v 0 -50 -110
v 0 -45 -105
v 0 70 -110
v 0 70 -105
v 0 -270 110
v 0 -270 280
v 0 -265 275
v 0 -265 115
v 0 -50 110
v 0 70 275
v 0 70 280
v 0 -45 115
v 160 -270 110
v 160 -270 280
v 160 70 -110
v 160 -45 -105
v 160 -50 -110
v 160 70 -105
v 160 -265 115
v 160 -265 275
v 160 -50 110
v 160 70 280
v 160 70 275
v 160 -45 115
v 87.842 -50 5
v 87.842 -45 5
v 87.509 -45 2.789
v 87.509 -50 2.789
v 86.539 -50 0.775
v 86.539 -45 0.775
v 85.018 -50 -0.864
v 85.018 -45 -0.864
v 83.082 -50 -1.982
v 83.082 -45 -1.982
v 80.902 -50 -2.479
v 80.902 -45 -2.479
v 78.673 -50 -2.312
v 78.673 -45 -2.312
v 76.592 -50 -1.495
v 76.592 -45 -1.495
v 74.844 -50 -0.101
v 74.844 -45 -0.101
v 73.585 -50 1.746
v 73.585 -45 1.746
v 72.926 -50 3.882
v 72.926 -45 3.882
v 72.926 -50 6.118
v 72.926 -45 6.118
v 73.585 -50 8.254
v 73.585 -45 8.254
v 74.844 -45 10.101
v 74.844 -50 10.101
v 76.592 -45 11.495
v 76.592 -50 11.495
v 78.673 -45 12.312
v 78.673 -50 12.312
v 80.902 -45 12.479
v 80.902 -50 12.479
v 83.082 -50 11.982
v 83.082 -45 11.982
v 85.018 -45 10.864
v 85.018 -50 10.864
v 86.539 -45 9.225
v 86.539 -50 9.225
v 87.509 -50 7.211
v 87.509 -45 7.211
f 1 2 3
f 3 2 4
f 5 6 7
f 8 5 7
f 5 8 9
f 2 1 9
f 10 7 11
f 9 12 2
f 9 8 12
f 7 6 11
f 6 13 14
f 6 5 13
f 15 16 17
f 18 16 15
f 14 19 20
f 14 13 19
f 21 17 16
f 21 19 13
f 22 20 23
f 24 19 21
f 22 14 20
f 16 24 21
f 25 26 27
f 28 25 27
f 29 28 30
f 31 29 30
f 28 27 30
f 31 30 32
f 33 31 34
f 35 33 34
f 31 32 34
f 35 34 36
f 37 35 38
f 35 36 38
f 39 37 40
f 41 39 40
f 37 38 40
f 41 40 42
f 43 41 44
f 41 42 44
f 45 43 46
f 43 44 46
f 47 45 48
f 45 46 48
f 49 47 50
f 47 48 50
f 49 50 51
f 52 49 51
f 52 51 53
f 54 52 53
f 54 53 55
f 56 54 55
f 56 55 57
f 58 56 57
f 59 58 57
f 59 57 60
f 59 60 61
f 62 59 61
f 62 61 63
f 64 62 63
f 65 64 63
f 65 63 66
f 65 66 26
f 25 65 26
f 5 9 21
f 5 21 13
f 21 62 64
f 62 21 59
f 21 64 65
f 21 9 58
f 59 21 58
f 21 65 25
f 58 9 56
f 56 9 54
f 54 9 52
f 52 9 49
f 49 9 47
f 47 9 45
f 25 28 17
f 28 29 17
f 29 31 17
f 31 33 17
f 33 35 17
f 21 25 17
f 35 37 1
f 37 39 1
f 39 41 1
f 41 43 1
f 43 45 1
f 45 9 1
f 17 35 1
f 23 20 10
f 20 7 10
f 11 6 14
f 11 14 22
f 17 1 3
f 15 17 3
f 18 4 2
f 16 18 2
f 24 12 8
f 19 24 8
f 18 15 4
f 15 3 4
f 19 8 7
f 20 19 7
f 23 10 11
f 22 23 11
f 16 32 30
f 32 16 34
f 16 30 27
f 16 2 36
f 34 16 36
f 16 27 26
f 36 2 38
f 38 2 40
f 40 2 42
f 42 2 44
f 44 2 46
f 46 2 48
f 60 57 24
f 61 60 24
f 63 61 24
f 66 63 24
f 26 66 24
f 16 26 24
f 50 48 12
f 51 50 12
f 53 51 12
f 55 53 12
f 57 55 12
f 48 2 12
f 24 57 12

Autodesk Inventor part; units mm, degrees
ref_plane "YZ Plane" through (0, 0, 0) normal (1, 0, 0) x (0, 1, 0)
ref_plane "XZ Plane" through (0, 0, 0) normal (0, 1, 0) x (-1, 0, 0)
ref_plane "XY Plane" through (0, 0, 0) normal (0, 0, 1) x (1, 0, 0)
sketch "Sketch1" plane through (0, 0, 0) normal (1, 0, 0) x (0, 1, 0)
  line L0 (-50, 110) -> (-50, -110)
  line L1 (-50, -110) -> (45, -110)
  line L2 (-50, 110) -> (-270, 110)
  line L3 (-270, 110) -> (-270, 280)
  line L4 (-270, 280) -> (70, 280)
  line L5 (70, -105) -> (-45, -105)
  line L6 (-45, -105) -> (-45, 115)
  line L7 (-45, 115) -> (-265, 115)
  line L8 (-265, 115) -> (-265, 275)
  line L9 (-265, 275) -> (45, 275)
  line L10 (-50, -110) -> (70, -110)
  line L11 (70, -110) -> (70, -105)
  line L12 (70, 275) -> (70, 280)
  line L13 (45, 275) -> (70, 275)
  point P0 (0, 0)
extrude "Extrusion1" add sketch "Sketch1" along normal blind 160
sketch "Sketch2" plane through (0, -45, 115) normal (0, 1, 0) x (1, 0, 0)
  circle A0 centre (80.342, 110) radius 7.5
  point P0 (0, 115)
  dimension "d10" = 15
extrude "Extrusion2" cut sketch "Sketch2" against normal blind 10
properties part number "Body Skeleton" material "Pine, Southern"
